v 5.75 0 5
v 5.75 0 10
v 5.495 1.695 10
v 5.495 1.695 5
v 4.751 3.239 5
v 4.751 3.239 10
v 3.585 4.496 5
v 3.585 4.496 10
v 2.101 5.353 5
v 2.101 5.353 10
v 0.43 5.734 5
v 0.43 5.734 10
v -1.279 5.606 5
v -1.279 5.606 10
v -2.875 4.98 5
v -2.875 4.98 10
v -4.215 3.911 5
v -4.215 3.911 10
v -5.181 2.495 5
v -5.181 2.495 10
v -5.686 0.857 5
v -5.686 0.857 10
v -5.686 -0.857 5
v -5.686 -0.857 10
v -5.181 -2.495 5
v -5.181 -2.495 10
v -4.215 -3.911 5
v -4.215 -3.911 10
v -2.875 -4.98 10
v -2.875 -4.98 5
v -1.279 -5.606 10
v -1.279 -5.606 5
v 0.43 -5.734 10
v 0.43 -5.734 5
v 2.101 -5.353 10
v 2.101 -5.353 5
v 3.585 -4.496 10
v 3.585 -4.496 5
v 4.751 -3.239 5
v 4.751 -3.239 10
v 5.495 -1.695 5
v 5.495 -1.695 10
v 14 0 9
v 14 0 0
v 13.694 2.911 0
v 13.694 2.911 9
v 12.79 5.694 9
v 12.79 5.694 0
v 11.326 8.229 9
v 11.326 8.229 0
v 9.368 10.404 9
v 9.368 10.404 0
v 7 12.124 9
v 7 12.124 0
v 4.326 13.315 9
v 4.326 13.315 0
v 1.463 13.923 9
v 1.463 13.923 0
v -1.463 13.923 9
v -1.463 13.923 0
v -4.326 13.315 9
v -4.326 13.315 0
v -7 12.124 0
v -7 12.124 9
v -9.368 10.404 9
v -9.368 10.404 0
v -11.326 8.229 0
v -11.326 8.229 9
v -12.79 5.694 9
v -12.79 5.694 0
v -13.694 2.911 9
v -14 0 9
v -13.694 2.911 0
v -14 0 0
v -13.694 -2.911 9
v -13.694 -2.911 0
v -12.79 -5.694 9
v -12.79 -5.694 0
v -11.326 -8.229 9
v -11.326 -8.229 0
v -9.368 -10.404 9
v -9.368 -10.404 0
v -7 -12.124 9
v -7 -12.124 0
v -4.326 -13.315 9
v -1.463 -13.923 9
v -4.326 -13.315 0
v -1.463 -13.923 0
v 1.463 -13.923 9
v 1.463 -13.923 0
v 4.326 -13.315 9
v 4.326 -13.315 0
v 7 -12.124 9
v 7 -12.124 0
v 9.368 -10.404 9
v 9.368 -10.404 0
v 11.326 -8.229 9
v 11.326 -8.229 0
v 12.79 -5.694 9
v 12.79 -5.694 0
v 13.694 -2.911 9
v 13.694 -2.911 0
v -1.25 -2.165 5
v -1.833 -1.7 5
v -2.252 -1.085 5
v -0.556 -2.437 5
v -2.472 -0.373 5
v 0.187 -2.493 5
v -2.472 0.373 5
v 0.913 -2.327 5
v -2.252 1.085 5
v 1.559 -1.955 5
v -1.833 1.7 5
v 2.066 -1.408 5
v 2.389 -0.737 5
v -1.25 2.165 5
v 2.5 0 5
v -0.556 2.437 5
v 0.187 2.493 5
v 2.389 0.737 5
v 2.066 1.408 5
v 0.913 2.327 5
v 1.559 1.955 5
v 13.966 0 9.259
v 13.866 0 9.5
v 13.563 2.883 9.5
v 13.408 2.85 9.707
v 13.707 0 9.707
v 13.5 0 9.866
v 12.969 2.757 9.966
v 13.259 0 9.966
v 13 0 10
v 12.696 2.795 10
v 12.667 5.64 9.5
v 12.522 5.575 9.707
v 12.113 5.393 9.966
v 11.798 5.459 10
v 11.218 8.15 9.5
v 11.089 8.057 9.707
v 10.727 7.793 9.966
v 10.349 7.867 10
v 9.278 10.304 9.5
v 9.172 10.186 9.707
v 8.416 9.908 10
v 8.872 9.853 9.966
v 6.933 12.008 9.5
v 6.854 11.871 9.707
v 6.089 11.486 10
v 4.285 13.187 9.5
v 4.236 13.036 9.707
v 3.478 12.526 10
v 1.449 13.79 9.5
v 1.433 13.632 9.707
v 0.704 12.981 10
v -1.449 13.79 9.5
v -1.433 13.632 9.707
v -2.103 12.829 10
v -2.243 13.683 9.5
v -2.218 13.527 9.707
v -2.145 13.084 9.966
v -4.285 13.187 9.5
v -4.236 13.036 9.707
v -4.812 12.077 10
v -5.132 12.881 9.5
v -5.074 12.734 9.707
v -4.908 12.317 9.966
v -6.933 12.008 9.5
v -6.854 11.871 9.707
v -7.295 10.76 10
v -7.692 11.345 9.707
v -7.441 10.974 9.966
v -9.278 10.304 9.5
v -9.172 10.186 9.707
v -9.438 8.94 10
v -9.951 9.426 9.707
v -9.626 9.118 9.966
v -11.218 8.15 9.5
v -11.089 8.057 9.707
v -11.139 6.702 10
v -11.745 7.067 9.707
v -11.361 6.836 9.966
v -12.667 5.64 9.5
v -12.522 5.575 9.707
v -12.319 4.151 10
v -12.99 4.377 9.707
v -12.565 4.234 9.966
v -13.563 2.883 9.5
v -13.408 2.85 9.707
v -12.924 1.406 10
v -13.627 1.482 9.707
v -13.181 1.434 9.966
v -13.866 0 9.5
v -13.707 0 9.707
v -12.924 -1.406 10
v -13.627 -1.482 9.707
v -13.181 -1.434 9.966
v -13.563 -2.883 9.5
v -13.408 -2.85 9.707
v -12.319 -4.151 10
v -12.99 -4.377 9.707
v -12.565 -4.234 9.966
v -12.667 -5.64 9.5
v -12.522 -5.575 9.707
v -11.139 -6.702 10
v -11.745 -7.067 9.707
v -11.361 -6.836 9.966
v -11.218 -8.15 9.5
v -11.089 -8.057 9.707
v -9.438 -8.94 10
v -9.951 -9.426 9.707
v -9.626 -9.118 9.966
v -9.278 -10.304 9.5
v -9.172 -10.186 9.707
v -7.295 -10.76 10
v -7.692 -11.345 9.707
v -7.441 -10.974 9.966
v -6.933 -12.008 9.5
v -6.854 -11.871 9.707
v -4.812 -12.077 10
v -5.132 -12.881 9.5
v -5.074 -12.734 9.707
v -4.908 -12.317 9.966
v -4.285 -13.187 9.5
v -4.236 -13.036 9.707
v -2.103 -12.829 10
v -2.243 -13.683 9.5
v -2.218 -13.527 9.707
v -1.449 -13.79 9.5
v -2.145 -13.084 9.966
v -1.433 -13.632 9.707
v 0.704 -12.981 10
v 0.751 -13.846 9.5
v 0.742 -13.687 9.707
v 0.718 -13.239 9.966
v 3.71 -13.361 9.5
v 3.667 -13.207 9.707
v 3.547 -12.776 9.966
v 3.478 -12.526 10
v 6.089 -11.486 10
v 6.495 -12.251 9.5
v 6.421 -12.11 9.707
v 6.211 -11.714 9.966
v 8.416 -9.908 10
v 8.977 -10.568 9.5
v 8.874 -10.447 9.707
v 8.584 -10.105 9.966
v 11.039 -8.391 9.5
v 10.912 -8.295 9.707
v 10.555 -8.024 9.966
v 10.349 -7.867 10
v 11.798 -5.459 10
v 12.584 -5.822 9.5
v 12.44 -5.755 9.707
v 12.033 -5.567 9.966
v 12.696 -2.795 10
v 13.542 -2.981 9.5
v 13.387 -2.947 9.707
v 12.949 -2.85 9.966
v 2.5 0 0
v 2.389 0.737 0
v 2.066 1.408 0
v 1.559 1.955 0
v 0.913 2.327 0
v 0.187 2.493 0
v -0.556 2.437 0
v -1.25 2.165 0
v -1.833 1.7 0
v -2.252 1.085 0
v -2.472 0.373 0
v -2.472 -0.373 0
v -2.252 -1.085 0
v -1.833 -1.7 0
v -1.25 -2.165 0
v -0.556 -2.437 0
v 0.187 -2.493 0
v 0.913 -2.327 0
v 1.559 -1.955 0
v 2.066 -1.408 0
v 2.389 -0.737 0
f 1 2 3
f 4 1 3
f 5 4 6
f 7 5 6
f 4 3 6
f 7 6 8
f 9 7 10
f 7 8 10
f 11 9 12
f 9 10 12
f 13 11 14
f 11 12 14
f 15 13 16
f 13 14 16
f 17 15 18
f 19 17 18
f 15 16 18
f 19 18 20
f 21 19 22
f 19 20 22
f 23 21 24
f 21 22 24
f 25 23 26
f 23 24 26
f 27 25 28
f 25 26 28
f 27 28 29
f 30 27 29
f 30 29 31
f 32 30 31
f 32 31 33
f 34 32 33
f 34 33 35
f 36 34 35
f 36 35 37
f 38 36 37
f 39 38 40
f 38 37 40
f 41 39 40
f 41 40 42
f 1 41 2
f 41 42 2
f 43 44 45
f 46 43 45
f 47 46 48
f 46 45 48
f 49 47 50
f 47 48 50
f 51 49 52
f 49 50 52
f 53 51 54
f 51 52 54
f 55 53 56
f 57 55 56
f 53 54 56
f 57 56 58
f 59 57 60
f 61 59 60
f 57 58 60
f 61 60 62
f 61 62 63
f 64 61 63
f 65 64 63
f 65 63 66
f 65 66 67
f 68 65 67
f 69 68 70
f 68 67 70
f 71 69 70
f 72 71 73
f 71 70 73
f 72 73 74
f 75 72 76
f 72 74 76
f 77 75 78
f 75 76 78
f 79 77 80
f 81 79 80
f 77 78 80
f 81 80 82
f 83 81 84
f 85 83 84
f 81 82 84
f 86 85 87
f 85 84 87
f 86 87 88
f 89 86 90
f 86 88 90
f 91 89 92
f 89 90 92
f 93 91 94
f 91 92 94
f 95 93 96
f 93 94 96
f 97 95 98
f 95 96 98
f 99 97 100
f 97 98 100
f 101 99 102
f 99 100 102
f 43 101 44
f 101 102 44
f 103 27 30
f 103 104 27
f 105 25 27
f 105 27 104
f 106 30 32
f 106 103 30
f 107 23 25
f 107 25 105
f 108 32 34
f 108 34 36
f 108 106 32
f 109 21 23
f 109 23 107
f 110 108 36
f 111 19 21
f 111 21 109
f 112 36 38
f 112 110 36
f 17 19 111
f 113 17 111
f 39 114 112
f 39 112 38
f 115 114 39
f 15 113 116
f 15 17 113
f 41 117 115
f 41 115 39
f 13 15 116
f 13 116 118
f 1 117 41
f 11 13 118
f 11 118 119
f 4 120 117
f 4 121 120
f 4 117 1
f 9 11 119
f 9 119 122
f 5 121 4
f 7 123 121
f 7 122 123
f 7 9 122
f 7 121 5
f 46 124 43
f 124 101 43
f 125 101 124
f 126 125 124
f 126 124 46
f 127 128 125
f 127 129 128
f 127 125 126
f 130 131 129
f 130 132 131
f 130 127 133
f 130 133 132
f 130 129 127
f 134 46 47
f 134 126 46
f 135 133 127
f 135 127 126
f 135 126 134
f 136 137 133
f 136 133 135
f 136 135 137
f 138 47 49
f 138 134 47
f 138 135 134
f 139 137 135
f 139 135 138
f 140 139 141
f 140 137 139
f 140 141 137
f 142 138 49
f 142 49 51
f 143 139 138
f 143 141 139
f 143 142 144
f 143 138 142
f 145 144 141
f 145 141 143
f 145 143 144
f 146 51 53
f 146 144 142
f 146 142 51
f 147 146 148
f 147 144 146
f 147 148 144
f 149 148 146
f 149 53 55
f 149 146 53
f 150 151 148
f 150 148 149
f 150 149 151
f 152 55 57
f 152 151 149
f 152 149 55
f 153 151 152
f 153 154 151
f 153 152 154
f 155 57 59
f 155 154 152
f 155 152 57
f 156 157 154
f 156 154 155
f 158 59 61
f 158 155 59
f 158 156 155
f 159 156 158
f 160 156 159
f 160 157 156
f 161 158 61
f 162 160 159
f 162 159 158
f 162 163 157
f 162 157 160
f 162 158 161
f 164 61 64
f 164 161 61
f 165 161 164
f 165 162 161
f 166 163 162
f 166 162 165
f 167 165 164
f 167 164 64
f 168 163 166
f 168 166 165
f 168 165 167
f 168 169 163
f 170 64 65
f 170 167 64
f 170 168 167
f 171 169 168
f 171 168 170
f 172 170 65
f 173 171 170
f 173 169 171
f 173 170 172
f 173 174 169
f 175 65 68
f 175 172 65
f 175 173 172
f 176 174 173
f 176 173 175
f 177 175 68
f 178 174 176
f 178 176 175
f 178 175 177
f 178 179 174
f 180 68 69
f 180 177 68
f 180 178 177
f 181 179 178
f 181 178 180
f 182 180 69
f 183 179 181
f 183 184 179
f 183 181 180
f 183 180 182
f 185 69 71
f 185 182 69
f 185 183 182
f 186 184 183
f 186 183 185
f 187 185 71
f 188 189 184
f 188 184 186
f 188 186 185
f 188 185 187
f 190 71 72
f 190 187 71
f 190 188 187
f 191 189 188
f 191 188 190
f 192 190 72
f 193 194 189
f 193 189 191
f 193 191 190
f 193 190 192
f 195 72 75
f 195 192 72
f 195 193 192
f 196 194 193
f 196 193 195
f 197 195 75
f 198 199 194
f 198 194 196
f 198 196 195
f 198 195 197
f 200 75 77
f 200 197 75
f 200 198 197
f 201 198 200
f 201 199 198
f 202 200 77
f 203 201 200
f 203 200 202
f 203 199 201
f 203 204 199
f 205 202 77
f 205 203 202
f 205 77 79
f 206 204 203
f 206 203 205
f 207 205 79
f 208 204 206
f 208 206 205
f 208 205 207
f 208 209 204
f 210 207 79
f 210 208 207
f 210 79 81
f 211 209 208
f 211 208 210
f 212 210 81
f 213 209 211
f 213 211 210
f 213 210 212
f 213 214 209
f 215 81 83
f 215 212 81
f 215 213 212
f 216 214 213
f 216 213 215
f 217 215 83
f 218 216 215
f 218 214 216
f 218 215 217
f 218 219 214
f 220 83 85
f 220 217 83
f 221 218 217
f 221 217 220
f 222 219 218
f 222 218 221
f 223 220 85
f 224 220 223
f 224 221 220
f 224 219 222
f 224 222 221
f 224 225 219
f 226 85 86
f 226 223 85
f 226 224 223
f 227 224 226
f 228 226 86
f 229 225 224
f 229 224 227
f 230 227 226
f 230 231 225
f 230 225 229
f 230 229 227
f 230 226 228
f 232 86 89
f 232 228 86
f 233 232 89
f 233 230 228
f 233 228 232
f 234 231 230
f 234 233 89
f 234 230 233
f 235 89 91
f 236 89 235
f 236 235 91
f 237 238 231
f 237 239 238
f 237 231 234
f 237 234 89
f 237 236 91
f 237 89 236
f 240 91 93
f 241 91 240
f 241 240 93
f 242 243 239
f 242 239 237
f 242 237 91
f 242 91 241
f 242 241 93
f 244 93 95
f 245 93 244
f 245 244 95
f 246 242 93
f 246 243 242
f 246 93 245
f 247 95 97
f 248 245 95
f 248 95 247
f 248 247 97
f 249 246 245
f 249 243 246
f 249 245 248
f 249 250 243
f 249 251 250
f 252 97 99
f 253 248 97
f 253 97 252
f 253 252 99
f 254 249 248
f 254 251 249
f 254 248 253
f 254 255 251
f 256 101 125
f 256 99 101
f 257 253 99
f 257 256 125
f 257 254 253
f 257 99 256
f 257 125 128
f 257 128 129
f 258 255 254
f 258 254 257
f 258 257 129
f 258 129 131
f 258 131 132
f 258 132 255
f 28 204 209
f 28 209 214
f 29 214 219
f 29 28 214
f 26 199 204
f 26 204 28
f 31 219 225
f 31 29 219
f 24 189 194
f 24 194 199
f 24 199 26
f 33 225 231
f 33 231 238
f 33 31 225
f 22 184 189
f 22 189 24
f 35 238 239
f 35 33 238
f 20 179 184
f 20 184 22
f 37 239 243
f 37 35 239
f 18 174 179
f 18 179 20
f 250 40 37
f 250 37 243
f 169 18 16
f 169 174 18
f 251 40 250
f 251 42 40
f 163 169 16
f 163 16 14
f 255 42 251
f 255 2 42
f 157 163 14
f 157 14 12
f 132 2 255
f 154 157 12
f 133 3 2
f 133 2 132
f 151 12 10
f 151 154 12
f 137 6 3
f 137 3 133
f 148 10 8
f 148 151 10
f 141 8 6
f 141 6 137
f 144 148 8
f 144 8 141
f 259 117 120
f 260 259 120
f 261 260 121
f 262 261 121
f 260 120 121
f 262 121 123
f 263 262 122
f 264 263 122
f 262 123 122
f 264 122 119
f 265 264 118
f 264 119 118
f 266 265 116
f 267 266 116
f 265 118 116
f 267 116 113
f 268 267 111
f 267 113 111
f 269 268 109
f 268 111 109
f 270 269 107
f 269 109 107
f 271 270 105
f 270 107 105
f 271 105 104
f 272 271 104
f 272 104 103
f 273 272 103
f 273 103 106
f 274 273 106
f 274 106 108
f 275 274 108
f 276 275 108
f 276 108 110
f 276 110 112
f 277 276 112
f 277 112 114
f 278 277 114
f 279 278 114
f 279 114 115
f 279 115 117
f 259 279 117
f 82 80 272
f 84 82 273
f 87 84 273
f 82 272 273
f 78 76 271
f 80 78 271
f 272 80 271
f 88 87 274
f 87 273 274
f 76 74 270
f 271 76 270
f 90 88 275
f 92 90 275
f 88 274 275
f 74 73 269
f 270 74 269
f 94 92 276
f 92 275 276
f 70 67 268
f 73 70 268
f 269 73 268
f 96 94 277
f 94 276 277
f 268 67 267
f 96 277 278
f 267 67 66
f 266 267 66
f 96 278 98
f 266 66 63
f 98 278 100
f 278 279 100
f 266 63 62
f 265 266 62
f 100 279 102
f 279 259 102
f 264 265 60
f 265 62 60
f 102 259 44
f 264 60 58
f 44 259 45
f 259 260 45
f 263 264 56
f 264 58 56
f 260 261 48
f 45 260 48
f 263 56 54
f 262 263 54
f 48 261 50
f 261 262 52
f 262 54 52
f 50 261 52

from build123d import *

# Parameters (mm, degrees)
F0_R     = 14
F1_DEPTH = 10
F2_R     = 5.75
F3_DEPTH = 5
F4_R     = 2.5
F5_DEPTH = 5.001
F6_R     = 1


with BuildPart() as f1:
    # F0 (on Top) → F1 (new body)
    with BuildSketch(Plane.XY):
        Circle(F0_R)
    extrude(amount=F1_DEPTH)

    # F2 (on face) → F3 (cut)
    with BuildSketch(Plane.XY.offset(10)):
        Circle(F2_R)
    extrude(amount=-F3_DEPTH, mode=Mode.SUBTRACT)

    # F4 (on face) → F5 (cut, through all)
    with BuildSketch(Plane.XY.offset(5)):
        Circle(F4_R)
    extrude(amount=-F5_DEPTH, mode=Mode.SUBTRACT)

    # F6
    f6_edges = [f1.edges().sort_by_distance(p)[0] for p in [
        (-14, 0, 10),
    ]]
    fillet(f6_edges, radius=F6_R)


solid = f1.part
